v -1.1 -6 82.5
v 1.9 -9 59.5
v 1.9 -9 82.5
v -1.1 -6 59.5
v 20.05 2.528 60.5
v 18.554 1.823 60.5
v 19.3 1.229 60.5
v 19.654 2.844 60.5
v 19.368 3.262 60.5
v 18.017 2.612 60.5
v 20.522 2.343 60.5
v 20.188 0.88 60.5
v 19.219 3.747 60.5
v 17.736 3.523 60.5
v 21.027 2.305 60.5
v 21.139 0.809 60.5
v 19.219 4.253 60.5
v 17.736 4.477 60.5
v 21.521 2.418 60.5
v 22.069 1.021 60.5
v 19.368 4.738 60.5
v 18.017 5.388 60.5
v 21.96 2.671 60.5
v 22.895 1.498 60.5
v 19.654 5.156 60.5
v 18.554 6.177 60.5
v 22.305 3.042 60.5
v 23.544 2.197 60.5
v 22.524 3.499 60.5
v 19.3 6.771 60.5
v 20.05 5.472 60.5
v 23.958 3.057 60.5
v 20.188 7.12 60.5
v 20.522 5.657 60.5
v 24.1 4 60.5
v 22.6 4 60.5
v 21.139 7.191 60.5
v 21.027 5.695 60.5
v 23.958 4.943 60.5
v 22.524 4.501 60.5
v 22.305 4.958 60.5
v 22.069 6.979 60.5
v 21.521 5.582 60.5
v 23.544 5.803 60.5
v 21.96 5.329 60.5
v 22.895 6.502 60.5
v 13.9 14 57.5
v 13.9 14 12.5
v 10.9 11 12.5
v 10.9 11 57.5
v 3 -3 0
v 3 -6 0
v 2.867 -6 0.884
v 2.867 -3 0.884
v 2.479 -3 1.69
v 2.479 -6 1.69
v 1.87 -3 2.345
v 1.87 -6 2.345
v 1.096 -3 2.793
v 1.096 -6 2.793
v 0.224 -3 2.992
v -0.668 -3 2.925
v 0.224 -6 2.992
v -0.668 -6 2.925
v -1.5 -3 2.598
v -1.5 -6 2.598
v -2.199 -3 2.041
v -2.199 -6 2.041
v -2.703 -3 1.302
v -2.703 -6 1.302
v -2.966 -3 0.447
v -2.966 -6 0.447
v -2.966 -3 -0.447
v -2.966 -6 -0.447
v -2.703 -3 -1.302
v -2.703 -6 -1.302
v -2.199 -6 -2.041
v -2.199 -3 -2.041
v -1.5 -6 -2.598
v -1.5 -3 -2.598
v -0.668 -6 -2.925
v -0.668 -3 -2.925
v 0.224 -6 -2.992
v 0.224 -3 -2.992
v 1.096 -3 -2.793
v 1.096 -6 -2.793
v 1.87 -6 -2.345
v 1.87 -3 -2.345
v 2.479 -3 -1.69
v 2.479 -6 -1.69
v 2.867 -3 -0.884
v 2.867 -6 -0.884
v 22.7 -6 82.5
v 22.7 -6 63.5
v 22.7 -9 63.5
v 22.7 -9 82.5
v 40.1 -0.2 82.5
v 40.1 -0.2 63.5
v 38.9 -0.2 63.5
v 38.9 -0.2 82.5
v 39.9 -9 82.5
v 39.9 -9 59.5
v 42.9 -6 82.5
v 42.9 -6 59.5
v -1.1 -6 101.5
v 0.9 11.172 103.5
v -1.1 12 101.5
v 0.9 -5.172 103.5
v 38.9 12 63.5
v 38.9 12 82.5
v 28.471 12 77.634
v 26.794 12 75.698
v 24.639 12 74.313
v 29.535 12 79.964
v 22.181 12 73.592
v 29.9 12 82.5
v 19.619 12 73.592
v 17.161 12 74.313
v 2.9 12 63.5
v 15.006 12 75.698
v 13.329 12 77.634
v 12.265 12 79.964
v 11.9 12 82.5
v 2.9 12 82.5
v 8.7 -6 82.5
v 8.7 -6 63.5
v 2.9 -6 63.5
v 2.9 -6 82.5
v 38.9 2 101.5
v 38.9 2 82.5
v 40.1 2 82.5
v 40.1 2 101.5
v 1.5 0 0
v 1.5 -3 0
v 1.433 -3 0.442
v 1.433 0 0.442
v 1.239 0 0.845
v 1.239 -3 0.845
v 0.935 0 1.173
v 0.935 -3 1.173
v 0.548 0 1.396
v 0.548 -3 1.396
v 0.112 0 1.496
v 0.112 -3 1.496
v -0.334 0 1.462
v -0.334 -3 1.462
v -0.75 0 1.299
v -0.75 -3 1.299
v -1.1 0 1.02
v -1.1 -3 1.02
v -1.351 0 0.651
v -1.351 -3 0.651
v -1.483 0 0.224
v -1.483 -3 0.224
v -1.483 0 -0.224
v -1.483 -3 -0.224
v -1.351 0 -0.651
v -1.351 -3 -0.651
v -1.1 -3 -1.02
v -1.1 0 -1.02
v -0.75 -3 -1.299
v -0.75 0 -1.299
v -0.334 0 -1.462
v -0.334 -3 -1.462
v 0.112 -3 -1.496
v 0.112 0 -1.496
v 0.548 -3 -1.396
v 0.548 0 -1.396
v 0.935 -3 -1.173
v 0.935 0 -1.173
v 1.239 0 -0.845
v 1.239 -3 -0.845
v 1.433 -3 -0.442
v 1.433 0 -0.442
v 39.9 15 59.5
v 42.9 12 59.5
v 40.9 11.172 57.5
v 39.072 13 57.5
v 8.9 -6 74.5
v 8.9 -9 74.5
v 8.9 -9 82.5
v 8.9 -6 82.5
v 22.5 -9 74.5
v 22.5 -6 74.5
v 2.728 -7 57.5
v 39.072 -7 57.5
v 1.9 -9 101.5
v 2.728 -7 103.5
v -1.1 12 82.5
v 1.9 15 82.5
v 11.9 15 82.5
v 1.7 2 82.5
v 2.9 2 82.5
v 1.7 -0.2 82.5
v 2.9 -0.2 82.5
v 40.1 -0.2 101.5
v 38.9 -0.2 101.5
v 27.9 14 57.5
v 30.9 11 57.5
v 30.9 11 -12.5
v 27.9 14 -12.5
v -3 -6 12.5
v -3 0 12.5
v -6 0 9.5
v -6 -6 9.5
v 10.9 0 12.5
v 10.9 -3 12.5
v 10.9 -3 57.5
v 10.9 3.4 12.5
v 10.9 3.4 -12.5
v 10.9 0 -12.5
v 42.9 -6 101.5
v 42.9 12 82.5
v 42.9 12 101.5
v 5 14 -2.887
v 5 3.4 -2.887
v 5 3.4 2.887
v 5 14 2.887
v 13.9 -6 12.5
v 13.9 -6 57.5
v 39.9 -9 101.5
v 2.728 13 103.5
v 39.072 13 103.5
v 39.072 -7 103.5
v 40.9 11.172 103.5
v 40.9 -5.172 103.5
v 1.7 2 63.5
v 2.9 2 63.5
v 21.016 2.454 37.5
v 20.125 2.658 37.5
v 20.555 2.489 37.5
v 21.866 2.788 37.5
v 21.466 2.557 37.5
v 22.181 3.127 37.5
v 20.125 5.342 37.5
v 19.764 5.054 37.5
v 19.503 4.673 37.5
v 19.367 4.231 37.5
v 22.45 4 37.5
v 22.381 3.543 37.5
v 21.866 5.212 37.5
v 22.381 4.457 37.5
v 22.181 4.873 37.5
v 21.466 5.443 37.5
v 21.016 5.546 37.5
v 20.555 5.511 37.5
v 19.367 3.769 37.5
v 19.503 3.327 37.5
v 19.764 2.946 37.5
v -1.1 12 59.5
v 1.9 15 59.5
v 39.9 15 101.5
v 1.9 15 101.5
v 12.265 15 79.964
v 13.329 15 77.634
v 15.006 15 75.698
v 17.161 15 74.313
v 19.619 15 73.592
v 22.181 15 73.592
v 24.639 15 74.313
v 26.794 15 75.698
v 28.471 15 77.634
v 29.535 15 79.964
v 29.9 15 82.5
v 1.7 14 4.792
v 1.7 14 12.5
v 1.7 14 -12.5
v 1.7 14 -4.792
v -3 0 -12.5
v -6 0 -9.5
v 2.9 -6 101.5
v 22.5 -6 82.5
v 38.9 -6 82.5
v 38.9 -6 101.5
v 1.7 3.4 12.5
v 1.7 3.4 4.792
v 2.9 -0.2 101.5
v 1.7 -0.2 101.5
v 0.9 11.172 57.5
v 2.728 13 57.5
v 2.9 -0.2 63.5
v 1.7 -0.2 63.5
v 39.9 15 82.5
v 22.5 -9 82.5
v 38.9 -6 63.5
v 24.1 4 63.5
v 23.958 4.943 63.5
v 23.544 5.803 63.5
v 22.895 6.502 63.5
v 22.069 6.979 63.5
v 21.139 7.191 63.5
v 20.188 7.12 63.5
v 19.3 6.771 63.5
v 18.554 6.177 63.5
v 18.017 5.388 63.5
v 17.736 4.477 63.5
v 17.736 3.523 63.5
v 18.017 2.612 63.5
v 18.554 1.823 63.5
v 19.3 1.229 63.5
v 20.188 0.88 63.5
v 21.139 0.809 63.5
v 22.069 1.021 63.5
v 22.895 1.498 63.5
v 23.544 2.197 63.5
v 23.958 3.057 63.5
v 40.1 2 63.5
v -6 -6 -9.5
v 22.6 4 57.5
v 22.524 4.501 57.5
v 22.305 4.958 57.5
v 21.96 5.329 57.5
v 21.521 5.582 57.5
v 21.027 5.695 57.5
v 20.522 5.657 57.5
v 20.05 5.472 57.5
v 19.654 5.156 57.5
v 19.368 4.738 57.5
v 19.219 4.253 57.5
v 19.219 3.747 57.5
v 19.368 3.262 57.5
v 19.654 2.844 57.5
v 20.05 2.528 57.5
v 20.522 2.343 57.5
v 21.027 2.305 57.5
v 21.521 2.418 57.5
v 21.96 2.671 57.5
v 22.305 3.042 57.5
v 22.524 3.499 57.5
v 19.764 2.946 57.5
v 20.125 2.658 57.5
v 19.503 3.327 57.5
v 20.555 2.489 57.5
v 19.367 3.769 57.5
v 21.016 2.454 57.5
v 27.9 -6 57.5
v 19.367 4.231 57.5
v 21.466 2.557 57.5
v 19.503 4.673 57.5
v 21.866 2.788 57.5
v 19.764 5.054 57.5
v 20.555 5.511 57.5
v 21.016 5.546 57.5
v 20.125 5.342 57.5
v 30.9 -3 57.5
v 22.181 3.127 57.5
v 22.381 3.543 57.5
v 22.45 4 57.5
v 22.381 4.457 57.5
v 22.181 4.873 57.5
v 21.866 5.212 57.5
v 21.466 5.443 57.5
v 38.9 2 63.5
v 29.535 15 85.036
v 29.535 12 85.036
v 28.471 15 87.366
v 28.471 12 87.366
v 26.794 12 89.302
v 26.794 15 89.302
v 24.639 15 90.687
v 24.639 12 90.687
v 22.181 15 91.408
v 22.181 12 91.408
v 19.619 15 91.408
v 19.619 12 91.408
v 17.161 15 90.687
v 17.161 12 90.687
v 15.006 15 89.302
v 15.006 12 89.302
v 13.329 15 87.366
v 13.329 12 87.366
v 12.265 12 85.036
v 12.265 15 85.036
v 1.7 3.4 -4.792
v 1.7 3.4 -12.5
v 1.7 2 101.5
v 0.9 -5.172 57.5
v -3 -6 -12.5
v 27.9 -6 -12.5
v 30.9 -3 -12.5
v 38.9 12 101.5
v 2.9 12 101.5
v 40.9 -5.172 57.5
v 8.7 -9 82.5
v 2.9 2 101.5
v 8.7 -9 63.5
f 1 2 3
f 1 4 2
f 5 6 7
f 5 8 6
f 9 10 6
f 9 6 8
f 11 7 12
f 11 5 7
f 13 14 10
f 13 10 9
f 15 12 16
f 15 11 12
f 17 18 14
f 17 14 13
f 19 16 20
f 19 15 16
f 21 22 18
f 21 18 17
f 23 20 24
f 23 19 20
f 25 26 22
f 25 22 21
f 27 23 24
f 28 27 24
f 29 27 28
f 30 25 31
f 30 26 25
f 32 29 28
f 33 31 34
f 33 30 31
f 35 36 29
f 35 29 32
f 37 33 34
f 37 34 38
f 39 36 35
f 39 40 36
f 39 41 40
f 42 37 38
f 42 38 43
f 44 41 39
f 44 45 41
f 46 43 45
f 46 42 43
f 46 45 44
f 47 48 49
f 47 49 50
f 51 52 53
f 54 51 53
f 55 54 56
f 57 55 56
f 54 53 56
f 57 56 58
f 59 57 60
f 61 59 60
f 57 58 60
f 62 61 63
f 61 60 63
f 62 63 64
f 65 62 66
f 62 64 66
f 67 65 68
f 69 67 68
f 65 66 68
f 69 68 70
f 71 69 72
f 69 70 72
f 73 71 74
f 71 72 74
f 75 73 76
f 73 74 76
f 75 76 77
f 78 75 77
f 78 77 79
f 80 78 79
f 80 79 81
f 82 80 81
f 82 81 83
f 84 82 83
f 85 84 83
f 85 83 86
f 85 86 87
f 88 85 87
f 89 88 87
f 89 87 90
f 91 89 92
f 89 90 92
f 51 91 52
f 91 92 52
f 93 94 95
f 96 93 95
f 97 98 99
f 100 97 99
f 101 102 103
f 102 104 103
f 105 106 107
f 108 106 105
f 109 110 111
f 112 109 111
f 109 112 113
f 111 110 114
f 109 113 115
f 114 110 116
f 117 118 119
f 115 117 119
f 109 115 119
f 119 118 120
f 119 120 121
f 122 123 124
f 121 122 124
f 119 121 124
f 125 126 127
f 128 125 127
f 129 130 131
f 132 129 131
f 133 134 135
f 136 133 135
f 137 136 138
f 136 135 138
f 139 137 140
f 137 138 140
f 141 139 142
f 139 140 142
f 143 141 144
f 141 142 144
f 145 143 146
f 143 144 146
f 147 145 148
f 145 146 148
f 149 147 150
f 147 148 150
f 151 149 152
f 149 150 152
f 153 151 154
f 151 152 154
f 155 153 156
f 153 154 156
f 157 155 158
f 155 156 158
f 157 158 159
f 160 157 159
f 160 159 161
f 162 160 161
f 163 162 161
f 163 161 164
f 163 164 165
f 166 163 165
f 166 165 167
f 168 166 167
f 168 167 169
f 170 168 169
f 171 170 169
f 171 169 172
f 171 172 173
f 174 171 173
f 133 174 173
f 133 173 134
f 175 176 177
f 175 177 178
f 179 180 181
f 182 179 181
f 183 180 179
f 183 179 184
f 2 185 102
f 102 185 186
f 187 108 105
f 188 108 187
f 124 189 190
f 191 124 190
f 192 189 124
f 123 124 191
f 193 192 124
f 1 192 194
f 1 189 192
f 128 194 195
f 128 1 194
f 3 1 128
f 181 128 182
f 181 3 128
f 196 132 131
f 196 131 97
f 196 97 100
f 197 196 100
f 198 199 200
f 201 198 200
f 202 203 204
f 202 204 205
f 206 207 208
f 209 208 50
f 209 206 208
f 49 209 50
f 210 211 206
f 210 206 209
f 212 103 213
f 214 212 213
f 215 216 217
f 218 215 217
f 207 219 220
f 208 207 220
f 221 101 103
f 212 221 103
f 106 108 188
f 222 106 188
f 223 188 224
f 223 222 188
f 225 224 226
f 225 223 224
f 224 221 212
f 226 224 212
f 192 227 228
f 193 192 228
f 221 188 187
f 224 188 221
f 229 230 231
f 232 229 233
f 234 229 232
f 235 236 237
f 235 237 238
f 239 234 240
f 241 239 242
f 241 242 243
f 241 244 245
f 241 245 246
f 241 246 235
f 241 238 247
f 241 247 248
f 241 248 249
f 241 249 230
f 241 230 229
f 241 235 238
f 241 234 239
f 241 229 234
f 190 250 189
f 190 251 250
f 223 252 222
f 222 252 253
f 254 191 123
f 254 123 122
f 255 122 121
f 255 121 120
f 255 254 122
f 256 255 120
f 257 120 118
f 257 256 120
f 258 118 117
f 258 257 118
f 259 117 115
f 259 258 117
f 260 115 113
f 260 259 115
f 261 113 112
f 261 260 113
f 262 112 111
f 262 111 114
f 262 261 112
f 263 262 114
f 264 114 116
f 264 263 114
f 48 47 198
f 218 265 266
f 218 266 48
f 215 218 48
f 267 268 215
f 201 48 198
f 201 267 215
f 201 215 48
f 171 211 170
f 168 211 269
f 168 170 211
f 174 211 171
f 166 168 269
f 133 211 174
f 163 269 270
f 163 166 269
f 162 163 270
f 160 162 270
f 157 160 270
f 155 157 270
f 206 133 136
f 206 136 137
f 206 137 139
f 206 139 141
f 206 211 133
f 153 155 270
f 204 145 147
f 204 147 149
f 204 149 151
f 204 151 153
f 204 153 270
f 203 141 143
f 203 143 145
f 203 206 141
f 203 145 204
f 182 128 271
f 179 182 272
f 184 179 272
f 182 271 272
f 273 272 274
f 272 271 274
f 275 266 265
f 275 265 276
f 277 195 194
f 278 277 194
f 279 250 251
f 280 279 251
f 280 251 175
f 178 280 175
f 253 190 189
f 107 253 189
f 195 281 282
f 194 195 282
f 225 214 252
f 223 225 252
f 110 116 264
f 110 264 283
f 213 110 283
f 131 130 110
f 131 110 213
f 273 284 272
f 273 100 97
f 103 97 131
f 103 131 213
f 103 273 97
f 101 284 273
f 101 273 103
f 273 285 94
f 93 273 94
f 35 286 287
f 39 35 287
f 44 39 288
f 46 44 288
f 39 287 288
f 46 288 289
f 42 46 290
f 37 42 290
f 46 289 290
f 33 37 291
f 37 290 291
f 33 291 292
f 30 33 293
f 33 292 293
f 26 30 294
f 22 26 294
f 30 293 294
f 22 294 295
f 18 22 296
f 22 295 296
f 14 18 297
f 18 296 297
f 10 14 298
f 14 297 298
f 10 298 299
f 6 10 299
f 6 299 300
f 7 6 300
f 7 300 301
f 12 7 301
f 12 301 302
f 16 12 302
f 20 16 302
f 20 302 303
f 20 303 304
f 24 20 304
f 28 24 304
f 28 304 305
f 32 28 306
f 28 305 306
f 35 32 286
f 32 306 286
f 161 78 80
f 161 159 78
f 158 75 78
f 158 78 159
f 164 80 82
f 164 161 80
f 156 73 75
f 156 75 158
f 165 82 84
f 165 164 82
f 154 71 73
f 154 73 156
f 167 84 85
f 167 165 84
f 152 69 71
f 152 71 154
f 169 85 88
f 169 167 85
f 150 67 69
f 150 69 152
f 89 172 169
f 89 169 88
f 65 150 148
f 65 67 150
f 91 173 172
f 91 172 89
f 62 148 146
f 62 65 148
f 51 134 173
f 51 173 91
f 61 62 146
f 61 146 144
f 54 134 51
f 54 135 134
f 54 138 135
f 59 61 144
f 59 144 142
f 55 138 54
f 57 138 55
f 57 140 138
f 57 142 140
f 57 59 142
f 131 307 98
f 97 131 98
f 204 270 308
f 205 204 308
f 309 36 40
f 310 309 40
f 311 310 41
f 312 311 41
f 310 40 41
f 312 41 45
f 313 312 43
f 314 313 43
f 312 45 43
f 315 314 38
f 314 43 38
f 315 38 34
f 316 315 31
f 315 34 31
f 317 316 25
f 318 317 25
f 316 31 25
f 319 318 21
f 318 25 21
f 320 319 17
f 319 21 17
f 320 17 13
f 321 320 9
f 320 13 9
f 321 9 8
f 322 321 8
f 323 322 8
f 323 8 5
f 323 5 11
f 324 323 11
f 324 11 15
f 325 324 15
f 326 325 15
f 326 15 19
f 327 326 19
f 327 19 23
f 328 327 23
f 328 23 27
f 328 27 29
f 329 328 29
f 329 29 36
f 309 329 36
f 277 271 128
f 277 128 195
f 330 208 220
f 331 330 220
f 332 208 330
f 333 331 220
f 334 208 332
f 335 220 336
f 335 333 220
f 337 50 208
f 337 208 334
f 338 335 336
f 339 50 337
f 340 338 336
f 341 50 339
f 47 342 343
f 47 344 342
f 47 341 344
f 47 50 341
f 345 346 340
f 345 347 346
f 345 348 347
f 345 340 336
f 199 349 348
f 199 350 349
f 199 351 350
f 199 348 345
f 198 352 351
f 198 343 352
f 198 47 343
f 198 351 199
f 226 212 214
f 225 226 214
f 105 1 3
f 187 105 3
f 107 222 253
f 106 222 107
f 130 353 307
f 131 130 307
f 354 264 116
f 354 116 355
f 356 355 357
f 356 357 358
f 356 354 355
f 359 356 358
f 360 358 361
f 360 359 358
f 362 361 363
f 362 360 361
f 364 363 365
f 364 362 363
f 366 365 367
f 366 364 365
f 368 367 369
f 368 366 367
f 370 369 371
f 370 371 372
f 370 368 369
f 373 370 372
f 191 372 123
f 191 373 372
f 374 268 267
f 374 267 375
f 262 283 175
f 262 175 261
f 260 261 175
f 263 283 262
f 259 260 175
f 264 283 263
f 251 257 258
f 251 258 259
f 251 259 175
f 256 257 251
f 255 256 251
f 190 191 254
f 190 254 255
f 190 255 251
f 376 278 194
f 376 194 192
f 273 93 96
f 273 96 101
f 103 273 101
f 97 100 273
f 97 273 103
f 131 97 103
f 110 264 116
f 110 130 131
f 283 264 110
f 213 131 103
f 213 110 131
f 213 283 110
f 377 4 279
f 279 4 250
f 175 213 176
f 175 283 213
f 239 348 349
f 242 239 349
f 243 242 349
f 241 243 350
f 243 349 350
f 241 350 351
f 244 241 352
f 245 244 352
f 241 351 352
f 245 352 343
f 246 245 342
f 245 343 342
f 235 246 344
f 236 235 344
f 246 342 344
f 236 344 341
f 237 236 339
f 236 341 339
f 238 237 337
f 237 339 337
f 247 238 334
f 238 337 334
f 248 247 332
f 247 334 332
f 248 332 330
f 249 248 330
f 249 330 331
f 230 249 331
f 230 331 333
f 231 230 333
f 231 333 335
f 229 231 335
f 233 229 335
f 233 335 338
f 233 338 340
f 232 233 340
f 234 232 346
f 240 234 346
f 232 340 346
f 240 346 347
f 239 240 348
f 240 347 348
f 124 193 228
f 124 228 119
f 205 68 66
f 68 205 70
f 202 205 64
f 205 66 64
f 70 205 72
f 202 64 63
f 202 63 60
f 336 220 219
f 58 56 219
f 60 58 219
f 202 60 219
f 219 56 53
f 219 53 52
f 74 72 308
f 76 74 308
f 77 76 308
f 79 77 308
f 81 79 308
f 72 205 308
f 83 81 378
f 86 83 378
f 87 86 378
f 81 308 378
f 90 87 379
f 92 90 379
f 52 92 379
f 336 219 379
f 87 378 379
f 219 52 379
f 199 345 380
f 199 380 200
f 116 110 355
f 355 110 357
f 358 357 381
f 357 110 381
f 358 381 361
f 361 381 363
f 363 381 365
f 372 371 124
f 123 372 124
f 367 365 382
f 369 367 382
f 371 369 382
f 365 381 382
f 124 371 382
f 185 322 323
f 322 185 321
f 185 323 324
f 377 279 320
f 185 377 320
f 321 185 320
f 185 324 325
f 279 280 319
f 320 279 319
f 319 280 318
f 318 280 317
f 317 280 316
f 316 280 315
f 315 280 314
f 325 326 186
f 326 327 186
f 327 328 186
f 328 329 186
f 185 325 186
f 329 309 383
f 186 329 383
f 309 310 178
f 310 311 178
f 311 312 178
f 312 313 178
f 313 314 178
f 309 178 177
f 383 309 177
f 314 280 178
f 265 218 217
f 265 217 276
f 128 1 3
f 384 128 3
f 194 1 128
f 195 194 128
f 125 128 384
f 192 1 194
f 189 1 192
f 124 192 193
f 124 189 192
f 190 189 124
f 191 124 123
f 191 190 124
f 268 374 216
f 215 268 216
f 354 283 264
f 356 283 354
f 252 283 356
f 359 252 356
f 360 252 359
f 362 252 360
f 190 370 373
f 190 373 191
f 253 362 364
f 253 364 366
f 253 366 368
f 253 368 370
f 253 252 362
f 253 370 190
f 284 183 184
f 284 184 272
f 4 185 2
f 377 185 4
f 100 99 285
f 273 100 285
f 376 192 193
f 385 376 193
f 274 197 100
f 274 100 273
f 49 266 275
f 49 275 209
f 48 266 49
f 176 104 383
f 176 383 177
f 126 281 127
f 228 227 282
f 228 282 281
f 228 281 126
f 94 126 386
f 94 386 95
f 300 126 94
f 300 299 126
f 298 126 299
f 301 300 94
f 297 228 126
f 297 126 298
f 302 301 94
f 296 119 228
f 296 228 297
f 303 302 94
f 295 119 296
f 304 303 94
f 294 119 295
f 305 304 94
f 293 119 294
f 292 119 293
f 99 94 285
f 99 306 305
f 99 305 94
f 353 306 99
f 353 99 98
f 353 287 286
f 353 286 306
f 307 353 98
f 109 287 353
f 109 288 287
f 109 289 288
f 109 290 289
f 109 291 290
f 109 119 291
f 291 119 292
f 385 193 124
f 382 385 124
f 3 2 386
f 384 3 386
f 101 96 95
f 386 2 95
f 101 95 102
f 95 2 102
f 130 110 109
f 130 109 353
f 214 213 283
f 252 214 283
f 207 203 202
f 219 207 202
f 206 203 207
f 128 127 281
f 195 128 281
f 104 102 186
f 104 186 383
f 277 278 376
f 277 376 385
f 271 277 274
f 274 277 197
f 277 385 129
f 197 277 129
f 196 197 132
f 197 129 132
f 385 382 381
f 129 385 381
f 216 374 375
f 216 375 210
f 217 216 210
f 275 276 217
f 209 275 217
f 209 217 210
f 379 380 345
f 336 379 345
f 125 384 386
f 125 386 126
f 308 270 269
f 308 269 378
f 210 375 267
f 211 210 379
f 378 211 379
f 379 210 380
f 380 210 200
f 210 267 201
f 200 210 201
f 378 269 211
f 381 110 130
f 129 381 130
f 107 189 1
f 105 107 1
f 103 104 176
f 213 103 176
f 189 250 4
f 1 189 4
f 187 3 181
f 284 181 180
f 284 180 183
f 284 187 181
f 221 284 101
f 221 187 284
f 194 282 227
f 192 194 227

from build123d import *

# Parameters (mm, degrees)
F1_DEPTH   = 12.5
F2_R       = 1.5
F3_DEPTH   = 6
F4_R       = 3
F5_DEPTH   = 3
F7_DEPTH   = 10.6
F8_W       = 20
F8_H       = 20
F9_DEPTH   = 45
F10_R      = 1.55
F11_DEPTH  = 20
F12_SIZE   = 3
F13_W      = 44
F13_H      = 24
F14_DEPTH  = 6
F16_DEPTH  = 19
F18_DEPTH  = 3
F19_SIZE   = 3
F21_DEPTH  = 19
F23_DEPTH  = 2
F24_W      = 13.6
F24_H      = 8
F25_DEPTH  = 3
F27_DEPTH  = 3
F28_SIZE   = 2
F28_2_SIZE = 2
F29_R      = 1.7
F30_DEPTH  = 6
F31_R      = 3.2
F32_DEPTH  = 3
F33_SIZE   = 3


with BuildPart() as f1:
    # F0 (on Top) → F1 (new body, symmetric)
    with BuildSketch(Plane.XY):
        Polygon((30.9, 14), (1.7, 14), (1.7, 3.4), (10.9, 3.4), (10.9, 0), (-6, 0), (-6, -6), (30.9, -6), align=None)
    extrude(amount=F1_DEPTH, both=True)

    # F2 (on face) → F3 (cut, through all)
    with BuildSketch(Plane.XZ.offset(6)):
        Circle(F2_R)
    extrude(amount=-F3_DEPTH, mode=Mode.SUBTRACT)

    # F4 (on face) → F5 (cut)
    with BuildSketch(Plane.XZ.offset(6)):
        Circle(F4_R)
    extrude(amount=-F5_DEPTH, mode=Mode.SUBTRACT)

    # F6 (on face) → F7 (cut, through all)
    with BuildSketch(Plane.XZ.offset(-3.4)):
        Polygon((5, -2.8867513459), (5, 2.8867513459), (0, 5.7735026919), (-5, 2.8867513459), (-5, -2.8867513459), (0, -5.7735026919), align=None)
    extrude(amount=-F7_DEPTH, mode=Mode.SUBTRACT)

    # F8 (on face) → F9 (join)
    with BuildSketch(Plane.XY.offset(12.5)):
        with Locations((20.9, 4)):
            Rectangle(F8_W, F8_H)
    extrude(amount=F9_DEPTH)

    # F10 (on face) → F11 (cut)
    with BuildSketch(Plane.XY.offset(57.5)):
        with Locations((20.9, 4)):
            Circle(F10_R)
    extrude(amount=-F11_DEPTH, mode=Mode.SUBTRACT)

    # F12
    f12_edges = [f1.edges().sort_by_distance(p)[0] for p in [
        (10.9, 14, 35),
        (10.9, -6, 35),
        (30.9, -6, 22.5),
        (30.9, 14, 22.5),
    ]]
    chamfer(f12_edges, length=F12_SIZE)

    # F33
    f33_edges = [f1.edges().sort_by_distance(p)[0] for p in [
        (-6, -3, 12.5),
        (-6, -3, -12.5),
    ]]
    chamfer(f33_edges, length=F33_SIZE)


with BuildPart() as f14:
    # F13 (on face) → F14 (new body)
    with BuildSketch(Plane.XY.offset(57.5)):
        with Locations((20.9, 3)):
            Rectangle(F13_W, F13_H)
    extrude(amount=F14_DEPTH)

    # F15 (on face) → F16 (join)
    with BuildSketch(Plane.XY.offset(63.5)):
        Polygon((11.9, 12), (11.9, 15), (-1.1, 15), (-1.1, -9), (8.7, -9), (8.7, -6), (2.9, -6), (2.9, -0.2), (1.7, -0.2), (1.7, 2), (2.9, 2), (2.9, 12), align=None)
        Polygon((42.9, 15), (29.9, 15), (29.9, 12), (38.9, 12), (38.9, 2), (40.1, 2), (40.1, -0.2), (38.9, -0.2), (38.9, -6), (22.7, -6), (22.7, -9), (42.9, -9), align=None)
    extrude(amount=F16_DEPTH)

    # F17 (on face) → F18 (join, through all)
    with BuildSketch(Plane(origin=(0, 15, 0), x_dir=(-1, 0, 0), z_dir=(0, 1, 0))):
        with BuildLine():
            ThreePointArc((-11.9, 82.5), (-20.9, 73.5), (-29.9, 82.5))
            Line((-29.9, 82.5), (-29.9, 63.5))
            Line((-29.9, 63.5), (-11.9, 63.5))
            Line((-11.9, 63.5), (-11.9, 82.5))
        make_face()
    extrude(amount=-F18_DEPTH)

    # F19
    f19_edges = [f14.edges().sort_by_distance(p)[0] for p in [
        (42.9, 15, 70),
        (-1.1, 15, 70),
        (-1.1, -9, 70),
        (42.9, -9, 70),
    ]]
    chamfer(f19_edges, length=F19_SIZE)

    # F28
    f28_edges = [f14.edges().sort_by_distance(p)[0] for p in [
        (20.9, 15, 57.5),
        (41.4, 13.5, 57.5),
        (0.4, 13.5, 57.5),
        (42.9, 3, 57.5),
        (-1.1, 3, 57.5),
        (41.4, -7.5, 57.5),
        (0.4, -7.5, 57.5),
        (20.9, -9, 57.5),
    ]]
    chamfer(f28_edges, length=F28_SIZE)

    # F29 (on face) → F30 (cut, through all)
    with BuildSketch(Plane.XY.offset(63.5)):
        with Locations((20.9, 4)):
            Circle(F29_R)
    extrude(amount=-F30_DEPTH, mode=Mode.SUBTRACT)

    # F31 (on face) → F32 (cut)
    with BuildSketch(Plane.XY.offset(63.5)):
        with Locations((20.9, 4)):
            Circle(F31_R)
    extrude(amount=-F32_DEPTH, mode=Mode.SUBTRACT)


with BuildPart() as f21:
    # F20 (on face) → F21 (new body)
    with BuildSketch(Plane.XY.offset(82.5)):
        Polygon((11.9, 15), (1.9, 15), (-1.1, 12), (-1.1, -6), (1.9, -9), (8.7, -9), (8.7, -6), (2.9, -6), (2.9, -0.2), (1.7, -0.2), (1.7, 2), (2.9, 2), (2.9, 12), (11.9, 12), align=None)
    extrude(amount=F21_DEPTH)



with BuildPart() as f21b:
    # F20 (on face) → F21, piece 2 (new body)
    with BuildSketch(Plane.XY.offset(82.5)):
        Polygon((42.9, 12), (39.9, 15), (29.9, 15), (29.9, 12), (38.9, 12), (38.9, 2), (40.1, 2), (40.1, -0.2), (38.9, -0.2), (38.9, -6), (22.7, -6), (22.7, -9), (39.9, -9), (42.9, -6), align=None)
    extrude(amount=F21_DEPTH)


with BuildPart() as f21_1:
    add(f21.part)

    add(f21b.part)  # F23 merges F21b
    # F22 (on face) → F23 (join)
    with BuildSketch(Plane.XY.offset(101.5)):
        Polygon((39.9, 15), (1.9, 15), (-1.1, 12), (-1.1, -6), (1.9, -9), (39.9, -9), (42.9, -6), (42.9, 12), align=None)
    extrude(amount=F23_DEPTH)

    # F24 (on face) → F25 (join, through all)
    with BuildSketch(Plane.XZ.offset(9)):
        Polygon((22.7, 101.5), (8.7, 101.5), (8.7, 82.5), (8.9, 82.5), (22.5, 82.5), (22.7, 82.5), align=None)
        with Locations((15.7, 78.5)):
            Rectangle(F24_W, F24_H)
    extrude(amount=-F25_DEPTH)

    # F26 (on face) → F27 (join, through all)
    with BuildSketch(Plane(origin=(0, 15, 0), x_dir=(-1, 0, 0), z_dir=(0, 1, 0))):
        with BuildLine():
            ThreePointArc((-29.9, 82.5), (-20.9, 91.5), (-11.9, 82.5))
            Line((-11.9, 82.5), (-11.9, 101.5))
            Line((-11.9, 101.5), (-29.9, 101.5))
            Line((-29.9, 101.5), (-29.9, 82.5))
        make_face()
    extrude(amount=-F27_DEPTH)

    # F28#2
    f28_2_edges = [f21_1.edges().sort_by_distance(p)[0] for p in [
        (20.9, 15, 103.5),
        (0.4, 13.5, 103.5),
        (-1.1, 3, 103.5),
        (0.4, -7.5, 103.5),
        (20.9, -9, 103.5),
        (41.4, -7.5, 103.5),
        (42.9, 3, 103.5),
        (41.4, 13.5, 103.5),
    ]]
    chamfer(f28_2_edges, length=F28_2_SIZE)


solid = Compound([f1.part, f14.part, f21_1.part])
